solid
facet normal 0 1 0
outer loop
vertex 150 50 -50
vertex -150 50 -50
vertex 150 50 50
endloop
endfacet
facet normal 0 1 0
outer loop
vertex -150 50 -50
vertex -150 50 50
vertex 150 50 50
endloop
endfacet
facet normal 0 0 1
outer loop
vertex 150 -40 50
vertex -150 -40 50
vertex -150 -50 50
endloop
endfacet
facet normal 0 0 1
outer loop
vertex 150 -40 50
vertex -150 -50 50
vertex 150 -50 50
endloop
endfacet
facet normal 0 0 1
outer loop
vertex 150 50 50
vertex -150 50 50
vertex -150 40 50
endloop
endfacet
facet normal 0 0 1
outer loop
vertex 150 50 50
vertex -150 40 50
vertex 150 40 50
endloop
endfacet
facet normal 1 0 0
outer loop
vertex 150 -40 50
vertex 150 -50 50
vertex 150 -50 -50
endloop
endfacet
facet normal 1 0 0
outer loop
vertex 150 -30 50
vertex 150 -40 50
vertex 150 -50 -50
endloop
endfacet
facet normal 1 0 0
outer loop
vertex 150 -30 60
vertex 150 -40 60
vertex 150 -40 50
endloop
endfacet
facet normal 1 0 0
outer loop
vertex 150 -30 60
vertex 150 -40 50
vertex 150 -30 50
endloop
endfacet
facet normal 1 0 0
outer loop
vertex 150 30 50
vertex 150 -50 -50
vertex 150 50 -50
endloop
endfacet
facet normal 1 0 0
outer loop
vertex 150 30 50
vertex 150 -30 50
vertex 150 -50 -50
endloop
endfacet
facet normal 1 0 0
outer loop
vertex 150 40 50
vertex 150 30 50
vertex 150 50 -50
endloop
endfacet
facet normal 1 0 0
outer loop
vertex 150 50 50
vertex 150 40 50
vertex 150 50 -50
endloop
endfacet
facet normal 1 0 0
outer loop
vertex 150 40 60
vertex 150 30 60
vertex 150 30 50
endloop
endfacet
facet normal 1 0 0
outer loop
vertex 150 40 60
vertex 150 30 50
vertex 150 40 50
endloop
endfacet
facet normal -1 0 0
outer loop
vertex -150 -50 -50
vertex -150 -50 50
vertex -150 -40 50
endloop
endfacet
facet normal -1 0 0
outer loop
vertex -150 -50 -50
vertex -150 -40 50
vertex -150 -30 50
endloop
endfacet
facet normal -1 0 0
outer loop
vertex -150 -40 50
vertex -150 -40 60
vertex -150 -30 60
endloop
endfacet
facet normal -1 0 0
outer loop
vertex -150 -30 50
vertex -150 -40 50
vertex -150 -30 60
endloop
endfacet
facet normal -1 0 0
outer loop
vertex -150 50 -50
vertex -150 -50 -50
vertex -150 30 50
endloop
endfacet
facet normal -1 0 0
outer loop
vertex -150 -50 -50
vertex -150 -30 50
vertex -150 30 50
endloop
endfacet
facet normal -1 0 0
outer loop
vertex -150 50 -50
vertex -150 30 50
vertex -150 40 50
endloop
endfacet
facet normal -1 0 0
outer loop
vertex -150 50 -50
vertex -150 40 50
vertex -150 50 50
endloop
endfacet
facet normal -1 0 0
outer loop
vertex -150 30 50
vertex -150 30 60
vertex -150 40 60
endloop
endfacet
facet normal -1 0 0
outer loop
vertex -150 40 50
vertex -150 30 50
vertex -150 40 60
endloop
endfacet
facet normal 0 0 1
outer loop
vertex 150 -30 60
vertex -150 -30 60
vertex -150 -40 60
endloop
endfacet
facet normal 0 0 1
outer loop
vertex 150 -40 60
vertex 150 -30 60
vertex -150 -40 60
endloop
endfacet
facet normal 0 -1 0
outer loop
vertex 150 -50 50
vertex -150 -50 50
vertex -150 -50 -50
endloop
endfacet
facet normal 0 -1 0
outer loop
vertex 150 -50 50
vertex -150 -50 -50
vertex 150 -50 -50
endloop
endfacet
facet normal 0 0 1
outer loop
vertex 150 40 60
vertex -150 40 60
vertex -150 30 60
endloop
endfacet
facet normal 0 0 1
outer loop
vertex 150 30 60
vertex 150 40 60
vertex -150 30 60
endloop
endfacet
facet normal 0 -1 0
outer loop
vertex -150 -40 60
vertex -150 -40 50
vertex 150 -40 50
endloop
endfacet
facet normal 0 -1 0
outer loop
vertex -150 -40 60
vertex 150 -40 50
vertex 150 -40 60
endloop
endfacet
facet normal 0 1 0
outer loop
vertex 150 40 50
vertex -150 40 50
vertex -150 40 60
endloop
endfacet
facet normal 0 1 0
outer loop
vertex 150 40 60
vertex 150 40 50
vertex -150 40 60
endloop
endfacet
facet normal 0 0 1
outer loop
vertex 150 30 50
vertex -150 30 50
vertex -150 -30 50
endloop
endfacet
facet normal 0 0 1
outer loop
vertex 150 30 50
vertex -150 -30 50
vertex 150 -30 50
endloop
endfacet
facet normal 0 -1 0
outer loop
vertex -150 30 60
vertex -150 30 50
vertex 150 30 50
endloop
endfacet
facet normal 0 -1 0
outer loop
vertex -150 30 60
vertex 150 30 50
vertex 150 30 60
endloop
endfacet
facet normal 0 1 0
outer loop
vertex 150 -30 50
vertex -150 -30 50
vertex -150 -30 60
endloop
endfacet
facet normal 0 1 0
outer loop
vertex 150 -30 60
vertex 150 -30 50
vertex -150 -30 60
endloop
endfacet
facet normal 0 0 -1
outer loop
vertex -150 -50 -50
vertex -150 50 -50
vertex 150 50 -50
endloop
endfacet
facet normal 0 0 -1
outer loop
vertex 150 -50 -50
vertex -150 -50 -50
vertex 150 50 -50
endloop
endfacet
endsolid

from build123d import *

# Parameters (mm, degrees)
F0_W     = 300
F0_H     = 100
F1_DEPTH = 50
F3_W     = 10
F3_H     = 10
F4_DEPTH = 300


with BuildPart() as f1:
    # F0 (on Top) → F1 (new body, symmetric)
    with BuildSketch(Plane.XY):
        Rectangle(F0_W, F0_H)
    extrude(amount=F1_DEPTH, both=True)

    # F3 (on face) → F4 (join)
    with BuildSketch(Plane(origin=(-150, 0, 0), x_dir=(0, -1, 0), z_dir=(-1, 0, 0))):
        with Locations((35, 55)):
            Rectangle(F3_W, F3_H)
        with Locations((-35, 55)):
            Rectangle(F3_W, F3_H)
    extrude(amount=-F4_DEPTH)


solid = f1.part
